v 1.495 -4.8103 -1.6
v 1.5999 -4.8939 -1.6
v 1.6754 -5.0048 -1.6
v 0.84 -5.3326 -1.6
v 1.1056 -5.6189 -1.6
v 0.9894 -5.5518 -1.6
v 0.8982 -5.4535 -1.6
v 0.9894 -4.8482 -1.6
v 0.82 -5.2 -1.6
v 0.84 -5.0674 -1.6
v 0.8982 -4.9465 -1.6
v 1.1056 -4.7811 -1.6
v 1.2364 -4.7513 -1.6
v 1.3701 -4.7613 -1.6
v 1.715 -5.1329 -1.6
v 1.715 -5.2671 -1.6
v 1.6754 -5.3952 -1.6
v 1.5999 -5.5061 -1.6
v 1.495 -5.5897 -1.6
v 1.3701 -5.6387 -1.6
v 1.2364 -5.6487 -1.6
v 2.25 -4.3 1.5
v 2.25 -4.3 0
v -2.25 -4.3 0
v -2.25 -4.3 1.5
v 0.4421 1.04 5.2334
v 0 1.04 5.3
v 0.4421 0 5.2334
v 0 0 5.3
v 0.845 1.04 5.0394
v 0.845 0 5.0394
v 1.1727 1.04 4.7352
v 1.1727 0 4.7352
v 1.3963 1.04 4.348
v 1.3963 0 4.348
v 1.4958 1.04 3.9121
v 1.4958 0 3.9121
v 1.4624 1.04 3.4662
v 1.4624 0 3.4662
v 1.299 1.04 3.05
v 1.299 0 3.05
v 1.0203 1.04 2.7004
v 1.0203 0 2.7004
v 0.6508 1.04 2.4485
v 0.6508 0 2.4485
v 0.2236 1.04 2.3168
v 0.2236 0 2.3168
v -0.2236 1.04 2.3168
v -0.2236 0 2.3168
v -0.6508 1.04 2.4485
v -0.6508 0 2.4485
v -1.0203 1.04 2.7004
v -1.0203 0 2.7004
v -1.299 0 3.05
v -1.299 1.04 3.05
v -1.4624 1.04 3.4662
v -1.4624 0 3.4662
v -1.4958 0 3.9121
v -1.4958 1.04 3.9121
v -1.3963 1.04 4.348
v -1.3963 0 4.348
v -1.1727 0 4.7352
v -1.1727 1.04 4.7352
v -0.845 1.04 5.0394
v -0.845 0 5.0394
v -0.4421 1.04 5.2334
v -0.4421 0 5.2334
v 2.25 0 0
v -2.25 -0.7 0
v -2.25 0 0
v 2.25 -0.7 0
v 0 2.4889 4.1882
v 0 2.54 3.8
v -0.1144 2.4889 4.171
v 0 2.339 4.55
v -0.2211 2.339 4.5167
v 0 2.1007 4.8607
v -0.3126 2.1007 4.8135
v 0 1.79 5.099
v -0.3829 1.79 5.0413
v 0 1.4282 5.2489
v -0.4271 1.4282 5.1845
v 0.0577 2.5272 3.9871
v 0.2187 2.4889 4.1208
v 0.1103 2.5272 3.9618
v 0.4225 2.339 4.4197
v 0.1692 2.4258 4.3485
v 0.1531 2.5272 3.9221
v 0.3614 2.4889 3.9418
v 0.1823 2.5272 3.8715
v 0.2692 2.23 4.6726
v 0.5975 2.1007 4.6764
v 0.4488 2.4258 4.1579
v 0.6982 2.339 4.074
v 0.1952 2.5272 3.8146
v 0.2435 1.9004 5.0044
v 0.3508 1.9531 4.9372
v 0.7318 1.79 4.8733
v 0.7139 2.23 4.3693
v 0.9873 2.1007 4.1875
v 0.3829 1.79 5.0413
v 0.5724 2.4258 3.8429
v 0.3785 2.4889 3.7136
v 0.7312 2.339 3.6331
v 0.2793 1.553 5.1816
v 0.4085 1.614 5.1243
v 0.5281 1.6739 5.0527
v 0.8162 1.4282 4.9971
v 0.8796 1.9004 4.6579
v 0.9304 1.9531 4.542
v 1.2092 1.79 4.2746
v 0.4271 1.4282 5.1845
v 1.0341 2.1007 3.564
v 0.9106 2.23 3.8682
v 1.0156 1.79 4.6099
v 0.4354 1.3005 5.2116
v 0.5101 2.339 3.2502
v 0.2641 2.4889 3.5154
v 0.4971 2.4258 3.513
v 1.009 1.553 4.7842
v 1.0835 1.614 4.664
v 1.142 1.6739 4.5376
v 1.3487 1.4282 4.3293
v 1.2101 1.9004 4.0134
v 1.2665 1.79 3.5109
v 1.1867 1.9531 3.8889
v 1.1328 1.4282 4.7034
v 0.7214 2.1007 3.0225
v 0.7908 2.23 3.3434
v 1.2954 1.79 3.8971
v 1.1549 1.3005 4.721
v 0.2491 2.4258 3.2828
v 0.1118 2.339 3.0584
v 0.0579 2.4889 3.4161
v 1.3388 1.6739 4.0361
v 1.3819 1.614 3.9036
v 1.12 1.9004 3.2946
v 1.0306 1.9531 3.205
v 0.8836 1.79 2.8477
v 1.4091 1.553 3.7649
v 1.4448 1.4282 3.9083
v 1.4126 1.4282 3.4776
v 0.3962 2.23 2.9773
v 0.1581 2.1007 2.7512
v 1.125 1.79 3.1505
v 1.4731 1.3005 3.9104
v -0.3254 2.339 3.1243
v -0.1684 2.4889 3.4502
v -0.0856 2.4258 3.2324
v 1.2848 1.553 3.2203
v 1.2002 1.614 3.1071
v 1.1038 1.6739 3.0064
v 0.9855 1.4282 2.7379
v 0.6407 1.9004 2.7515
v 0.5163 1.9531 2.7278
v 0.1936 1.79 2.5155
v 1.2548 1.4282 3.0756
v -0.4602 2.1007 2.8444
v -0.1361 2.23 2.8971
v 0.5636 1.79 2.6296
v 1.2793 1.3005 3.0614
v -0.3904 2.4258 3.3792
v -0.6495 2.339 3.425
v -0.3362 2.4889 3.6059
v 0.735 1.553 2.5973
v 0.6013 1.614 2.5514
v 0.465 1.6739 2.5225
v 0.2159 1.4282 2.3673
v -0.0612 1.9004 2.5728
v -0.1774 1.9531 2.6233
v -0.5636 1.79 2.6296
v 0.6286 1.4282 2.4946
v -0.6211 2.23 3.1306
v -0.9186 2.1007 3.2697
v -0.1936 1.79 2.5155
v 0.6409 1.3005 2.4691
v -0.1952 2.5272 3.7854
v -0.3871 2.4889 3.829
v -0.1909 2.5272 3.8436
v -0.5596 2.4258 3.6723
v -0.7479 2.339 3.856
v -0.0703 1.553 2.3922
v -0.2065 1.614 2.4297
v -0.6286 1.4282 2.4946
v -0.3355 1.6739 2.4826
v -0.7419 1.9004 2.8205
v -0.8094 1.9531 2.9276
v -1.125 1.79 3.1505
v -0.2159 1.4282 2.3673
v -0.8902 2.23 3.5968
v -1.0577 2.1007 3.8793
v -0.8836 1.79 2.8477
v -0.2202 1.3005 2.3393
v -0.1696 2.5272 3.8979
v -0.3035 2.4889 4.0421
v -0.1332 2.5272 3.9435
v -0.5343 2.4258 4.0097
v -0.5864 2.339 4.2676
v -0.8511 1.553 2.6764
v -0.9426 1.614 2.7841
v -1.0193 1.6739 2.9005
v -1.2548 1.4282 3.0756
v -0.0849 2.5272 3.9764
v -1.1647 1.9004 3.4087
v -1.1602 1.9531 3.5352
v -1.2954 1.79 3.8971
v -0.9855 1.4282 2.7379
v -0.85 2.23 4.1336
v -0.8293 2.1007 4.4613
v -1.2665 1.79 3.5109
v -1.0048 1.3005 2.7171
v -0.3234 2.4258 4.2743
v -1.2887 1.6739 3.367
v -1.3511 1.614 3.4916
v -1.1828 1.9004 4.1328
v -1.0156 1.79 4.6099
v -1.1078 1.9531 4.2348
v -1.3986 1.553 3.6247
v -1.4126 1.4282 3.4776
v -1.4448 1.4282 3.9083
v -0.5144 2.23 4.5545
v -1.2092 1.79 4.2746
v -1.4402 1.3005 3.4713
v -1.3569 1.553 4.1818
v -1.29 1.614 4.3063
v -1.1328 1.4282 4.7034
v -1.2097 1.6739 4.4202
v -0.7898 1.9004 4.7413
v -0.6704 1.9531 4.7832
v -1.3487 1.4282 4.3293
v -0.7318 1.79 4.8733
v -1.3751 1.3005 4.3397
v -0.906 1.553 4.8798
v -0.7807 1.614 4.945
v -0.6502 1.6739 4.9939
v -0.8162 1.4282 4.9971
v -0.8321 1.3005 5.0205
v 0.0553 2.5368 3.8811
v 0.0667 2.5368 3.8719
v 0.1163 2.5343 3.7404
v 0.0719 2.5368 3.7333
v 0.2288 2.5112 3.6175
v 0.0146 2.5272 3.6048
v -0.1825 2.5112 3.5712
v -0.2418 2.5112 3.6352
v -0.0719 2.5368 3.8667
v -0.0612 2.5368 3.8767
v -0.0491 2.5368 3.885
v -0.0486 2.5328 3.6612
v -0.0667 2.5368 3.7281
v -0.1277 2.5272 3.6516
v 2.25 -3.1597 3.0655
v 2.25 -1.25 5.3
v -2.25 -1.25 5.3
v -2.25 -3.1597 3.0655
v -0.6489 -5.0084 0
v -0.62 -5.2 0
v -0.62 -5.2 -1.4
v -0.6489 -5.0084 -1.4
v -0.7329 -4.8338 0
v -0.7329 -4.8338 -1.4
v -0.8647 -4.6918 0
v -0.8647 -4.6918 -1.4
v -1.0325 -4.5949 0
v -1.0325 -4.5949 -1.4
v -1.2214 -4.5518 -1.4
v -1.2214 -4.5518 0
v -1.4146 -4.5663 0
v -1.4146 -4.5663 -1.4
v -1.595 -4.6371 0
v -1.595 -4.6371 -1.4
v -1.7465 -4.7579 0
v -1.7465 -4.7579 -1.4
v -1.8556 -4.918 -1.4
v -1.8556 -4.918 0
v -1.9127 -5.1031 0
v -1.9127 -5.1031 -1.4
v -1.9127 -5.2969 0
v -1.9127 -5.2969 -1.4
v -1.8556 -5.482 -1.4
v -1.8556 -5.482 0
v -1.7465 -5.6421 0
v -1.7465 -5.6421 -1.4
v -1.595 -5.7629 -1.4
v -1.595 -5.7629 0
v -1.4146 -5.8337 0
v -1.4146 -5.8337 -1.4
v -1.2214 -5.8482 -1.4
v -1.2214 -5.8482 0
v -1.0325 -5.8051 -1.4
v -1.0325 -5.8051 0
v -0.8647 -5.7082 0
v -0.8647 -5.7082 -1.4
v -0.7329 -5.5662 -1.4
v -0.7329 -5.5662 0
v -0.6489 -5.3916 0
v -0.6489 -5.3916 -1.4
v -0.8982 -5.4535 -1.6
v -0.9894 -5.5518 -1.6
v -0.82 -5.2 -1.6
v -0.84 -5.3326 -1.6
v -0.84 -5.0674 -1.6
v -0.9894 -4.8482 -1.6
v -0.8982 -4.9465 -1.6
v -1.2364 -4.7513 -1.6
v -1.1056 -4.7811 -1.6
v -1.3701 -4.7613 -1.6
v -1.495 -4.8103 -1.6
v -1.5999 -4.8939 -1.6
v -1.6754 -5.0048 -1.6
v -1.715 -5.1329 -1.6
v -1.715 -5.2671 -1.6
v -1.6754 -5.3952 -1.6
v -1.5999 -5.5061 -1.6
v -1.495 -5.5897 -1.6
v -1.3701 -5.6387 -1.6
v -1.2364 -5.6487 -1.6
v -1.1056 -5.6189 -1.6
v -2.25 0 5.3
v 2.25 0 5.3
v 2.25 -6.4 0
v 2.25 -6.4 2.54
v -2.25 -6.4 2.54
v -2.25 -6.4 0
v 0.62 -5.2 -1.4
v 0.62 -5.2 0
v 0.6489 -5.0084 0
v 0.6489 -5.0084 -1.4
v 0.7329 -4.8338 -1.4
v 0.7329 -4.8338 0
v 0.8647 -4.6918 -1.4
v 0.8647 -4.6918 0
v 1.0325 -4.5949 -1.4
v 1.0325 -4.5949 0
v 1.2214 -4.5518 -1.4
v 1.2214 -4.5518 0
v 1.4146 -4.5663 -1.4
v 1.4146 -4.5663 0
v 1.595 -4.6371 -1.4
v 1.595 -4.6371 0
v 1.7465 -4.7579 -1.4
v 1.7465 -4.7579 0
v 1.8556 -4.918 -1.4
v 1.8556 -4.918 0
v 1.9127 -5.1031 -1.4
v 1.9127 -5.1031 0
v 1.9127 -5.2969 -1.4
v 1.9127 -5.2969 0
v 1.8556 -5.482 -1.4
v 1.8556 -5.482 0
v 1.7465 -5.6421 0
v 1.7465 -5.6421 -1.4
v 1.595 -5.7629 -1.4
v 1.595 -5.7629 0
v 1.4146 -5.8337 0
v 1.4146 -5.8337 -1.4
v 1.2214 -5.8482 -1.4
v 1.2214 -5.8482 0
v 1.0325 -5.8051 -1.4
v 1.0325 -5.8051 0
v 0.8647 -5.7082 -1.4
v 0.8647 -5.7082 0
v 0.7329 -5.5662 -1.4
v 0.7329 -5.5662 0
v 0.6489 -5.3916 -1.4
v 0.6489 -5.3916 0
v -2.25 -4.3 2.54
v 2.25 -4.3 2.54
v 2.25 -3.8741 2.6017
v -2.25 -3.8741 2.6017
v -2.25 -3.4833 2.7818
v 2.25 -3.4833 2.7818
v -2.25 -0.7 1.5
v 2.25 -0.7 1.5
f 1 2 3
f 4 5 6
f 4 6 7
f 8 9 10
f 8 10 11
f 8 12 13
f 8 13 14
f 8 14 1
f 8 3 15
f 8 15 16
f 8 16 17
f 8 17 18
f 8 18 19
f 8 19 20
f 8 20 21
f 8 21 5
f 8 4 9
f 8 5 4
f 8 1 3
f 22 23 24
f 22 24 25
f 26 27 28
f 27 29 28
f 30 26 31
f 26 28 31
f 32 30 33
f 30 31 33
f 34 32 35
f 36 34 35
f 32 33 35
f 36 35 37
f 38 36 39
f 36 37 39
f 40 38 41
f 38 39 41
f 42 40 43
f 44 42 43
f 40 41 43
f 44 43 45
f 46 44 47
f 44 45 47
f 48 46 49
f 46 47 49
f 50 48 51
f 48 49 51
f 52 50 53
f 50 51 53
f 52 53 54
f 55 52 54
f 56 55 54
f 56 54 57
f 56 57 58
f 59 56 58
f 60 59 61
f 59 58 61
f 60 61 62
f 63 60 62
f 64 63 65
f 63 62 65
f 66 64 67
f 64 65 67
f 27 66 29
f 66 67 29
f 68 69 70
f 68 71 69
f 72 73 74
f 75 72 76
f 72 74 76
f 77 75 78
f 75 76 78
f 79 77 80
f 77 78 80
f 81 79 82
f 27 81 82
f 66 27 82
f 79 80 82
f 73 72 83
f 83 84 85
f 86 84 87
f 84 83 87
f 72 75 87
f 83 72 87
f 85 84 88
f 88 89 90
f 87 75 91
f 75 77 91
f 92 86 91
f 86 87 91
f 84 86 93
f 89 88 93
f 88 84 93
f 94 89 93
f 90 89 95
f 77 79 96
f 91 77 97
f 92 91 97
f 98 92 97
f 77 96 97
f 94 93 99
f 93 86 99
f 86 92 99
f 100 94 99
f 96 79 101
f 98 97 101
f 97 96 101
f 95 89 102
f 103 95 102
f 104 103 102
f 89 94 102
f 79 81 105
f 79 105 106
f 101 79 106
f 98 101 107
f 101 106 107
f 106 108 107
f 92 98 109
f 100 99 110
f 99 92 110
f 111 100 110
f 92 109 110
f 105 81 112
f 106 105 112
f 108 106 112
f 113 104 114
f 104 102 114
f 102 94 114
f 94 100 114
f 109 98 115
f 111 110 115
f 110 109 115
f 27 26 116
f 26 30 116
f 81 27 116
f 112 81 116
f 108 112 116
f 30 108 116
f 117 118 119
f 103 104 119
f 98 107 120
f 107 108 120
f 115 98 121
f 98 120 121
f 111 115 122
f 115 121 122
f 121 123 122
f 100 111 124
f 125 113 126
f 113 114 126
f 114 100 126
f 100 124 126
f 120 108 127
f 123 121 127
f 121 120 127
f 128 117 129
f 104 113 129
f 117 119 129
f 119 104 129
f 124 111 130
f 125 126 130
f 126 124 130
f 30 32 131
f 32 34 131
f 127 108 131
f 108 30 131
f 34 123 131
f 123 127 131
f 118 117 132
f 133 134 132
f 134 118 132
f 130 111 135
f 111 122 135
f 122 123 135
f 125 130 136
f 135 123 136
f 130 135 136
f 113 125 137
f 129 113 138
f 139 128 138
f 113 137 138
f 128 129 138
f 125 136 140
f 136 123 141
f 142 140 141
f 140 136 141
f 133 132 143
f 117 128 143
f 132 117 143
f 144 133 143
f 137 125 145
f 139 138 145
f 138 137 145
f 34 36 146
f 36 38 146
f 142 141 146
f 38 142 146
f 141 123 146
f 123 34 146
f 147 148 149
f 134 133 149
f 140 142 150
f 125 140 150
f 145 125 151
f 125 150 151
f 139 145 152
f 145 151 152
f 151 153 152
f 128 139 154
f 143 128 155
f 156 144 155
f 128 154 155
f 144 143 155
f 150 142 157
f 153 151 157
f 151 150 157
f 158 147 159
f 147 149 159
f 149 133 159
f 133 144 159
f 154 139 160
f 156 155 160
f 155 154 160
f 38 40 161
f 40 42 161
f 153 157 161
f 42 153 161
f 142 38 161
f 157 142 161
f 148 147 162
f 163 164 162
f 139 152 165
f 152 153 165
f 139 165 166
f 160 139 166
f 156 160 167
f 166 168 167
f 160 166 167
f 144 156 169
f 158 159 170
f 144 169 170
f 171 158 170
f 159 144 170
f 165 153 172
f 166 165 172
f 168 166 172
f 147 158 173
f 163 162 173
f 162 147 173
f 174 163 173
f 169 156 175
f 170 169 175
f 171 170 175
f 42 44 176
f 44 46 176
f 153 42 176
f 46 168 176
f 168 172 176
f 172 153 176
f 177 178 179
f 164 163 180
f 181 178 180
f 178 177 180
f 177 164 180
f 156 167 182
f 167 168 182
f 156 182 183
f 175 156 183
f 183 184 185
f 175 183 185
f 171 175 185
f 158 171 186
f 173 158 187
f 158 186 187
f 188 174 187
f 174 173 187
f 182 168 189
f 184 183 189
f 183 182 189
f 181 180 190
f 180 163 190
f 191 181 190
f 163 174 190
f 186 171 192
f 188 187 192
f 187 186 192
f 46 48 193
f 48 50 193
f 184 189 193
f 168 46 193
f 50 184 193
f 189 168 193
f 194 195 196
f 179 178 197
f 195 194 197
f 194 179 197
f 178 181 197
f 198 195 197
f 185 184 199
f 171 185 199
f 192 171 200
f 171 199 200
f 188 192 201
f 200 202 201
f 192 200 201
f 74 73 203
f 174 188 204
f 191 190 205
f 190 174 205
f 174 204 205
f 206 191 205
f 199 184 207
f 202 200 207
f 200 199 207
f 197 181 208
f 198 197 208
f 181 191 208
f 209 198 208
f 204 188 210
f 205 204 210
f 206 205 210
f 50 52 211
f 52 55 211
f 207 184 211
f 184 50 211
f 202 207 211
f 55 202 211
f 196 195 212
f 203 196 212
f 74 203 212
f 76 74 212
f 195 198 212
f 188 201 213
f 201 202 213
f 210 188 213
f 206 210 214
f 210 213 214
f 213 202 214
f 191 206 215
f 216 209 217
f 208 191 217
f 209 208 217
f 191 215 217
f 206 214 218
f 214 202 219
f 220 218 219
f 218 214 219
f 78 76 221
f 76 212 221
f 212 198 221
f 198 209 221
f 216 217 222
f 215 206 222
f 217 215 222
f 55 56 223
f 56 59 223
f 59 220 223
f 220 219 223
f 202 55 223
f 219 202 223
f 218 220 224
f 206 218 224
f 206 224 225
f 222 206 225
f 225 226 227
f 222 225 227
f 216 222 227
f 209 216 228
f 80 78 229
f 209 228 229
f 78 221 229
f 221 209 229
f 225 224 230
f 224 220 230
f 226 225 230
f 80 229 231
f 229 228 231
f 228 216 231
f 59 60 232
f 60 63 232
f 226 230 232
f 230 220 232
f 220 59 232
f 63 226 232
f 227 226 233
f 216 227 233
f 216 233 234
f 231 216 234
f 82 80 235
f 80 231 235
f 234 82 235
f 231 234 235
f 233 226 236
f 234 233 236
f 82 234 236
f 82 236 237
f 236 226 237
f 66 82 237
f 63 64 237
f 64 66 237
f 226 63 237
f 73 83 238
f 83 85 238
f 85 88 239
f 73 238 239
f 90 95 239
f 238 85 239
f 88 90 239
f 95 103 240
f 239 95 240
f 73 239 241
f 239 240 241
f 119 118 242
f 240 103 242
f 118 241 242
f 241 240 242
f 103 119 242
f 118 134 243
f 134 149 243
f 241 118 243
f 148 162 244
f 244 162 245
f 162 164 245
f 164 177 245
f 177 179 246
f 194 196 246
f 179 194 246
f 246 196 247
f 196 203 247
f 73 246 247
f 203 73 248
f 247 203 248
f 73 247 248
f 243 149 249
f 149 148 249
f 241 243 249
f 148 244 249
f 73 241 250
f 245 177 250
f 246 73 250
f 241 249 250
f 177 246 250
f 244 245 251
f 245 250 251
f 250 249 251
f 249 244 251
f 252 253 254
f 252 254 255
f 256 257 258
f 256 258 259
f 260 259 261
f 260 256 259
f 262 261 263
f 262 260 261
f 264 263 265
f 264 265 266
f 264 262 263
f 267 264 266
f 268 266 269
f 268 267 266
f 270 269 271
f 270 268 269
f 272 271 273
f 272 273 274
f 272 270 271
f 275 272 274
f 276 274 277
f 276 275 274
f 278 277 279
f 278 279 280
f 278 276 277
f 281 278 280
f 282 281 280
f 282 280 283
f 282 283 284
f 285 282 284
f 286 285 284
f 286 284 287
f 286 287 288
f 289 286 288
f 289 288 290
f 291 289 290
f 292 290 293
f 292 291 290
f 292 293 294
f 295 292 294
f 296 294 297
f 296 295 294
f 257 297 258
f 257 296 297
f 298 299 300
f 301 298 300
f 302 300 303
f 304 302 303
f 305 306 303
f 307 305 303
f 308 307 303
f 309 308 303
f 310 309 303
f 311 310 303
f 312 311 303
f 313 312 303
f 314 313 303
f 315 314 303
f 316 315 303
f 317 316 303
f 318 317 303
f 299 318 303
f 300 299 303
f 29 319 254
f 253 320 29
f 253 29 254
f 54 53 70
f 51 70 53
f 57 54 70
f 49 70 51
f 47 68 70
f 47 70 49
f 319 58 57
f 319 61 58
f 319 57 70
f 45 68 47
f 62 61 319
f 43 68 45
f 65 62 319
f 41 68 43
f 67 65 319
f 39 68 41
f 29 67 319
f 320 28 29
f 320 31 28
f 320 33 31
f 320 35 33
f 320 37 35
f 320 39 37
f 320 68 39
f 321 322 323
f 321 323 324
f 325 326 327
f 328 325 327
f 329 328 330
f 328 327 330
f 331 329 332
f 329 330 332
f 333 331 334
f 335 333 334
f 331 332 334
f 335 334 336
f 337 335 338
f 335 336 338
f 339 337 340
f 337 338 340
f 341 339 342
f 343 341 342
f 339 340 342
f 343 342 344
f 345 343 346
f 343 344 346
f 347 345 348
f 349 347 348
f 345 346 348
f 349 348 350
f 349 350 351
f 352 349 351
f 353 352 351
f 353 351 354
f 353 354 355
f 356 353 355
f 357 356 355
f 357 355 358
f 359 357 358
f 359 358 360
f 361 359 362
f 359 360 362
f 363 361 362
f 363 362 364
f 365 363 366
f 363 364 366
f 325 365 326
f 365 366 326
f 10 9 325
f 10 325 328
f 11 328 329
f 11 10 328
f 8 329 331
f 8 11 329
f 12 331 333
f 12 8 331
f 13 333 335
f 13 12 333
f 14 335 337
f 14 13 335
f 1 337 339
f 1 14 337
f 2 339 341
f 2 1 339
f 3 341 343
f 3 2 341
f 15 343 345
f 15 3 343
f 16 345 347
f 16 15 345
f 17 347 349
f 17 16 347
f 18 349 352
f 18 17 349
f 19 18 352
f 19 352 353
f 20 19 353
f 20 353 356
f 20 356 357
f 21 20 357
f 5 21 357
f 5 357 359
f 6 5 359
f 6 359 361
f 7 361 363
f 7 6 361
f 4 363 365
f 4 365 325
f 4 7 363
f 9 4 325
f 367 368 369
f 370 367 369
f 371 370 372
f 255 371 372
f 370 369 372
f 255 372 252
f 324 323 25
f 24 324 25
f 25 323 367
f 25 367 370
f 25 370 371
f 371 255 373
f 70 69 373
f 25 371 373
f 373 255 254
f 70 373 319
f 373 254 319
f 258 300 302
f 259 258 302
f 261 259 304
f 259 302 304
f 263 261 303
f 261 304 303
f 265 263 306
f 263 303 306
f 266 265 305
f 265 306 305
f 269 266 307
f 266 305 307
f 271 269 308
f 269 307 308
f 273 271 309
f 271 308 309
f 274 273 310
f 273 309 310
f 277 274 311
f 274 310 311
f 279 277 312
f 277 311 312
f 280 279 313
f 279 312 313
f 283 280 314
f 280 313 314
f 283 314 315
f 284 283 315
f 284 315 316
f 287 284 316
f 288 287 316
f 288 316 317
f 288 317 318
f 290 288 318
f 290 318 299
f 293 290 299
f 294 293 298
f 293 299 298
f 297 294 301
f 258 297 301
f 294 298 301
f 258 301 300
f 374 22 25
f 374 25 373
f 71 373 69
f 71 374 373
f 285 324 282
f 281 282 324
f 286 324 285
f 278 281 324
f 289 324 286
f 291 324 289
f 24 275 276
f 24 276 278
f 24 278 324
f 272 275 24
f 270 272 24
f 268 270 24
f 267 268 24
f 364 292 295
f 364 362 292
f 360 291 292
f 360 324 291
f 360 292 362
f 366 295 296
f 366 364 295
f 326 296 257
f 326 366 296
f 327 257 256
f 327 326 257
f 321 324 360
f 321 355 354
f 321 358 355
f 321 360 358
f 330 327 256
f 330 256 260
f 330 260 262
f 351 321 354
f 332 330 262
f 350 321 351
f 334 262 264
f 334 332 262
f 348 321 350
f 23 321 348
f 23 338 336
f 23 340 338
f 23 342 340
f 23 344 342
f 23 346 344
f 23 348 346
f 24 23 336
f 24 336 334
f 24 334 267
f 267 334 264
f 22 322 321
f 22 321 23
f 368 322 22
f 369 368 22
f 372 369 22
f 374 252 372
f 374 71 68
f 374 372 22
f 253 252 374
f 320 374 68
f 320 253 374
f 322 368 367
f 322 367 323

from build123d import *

# Parameters (mm, degrees)
PAD013_DEPTH    = 2.25
SKETCH022_R     = 0.65
PAD014_DEPTH    = 1.6
CHAMFER003_SIZE = 0.2


with BuildPart() as part:
    # Sketch020 → Pad013 (new body, symmetric)
    with BuildSketch(Plane.YZ):
        with BuildLine():
            Line((0, 0), (0, 5.3))
            Line((0, 5.3), (-1.25, 5.3))
            Line((-1.25, 5.3), (-3.159701, 3.065466))
            ThreePointArc((-4.3, 2.54), (-3.672227, 2.677686), (-3.159701, 3.065466))
            Line((-4.3, 2.54), (-6.4, 2.54))
            Line((-6.4, 2.54), (-6.4, 0))
            Line((-6.4, 0), (-4.3, 0))
            Line((-4.3, 0), (-4.3, 1.5))
            Line((-4.3, 1.5), (-0.7, 1.5))
            Line((-0.7, 1.5), (-0.7, 0))
            Line((-0.7, 0), (0, 0))
        make_face()
    extrude(amount=PAD013_DEPTH, both=True)

    # Sketch021 → Revolution (revolve)
    with BuildSketch(Plane.YZ):
        with BuildLine():
            Line((0, 3.8), (2.54, 3.8))
            ThreePointArc((2.54, 3.8), (2.10066, 4.86066), (1.04, 5.3))
            Line((1.04, 5.3), (0, 5.3))
            Line((0, 5.3), (0, 3.8))
        make_face()
    revolve(axis=Axis((0, 2.54, 3.8), (0, 1, 0)))

    # Sketch022 → Pad014 (join)
    with BuildSketch(Plane.XY):
        with Locations((-1.27, -5.2)):
            Circle(SKETCH022_R)
    pad014 = extrude(amount=-PAD014_DEPTH)

    # Mirrored003: Pad014 across Sketch022 V_Axis
    add(pad014.mirror(Plane(origin=(0, 0, 0), x_dir=(0, 0, 1), z_dir=(1, 0, 0))))

    # Chamfer003
    chamfer003_edges = [part.edges().sort_by_distance(p)[0] for p in [
        (1.92, -5.2, -1.6),
        (-1.92, -5.2, -1.6),
    ]]
    chamfer(chamfer003_edges, length=CHAMFER003_SIZE)


solid = part.part
